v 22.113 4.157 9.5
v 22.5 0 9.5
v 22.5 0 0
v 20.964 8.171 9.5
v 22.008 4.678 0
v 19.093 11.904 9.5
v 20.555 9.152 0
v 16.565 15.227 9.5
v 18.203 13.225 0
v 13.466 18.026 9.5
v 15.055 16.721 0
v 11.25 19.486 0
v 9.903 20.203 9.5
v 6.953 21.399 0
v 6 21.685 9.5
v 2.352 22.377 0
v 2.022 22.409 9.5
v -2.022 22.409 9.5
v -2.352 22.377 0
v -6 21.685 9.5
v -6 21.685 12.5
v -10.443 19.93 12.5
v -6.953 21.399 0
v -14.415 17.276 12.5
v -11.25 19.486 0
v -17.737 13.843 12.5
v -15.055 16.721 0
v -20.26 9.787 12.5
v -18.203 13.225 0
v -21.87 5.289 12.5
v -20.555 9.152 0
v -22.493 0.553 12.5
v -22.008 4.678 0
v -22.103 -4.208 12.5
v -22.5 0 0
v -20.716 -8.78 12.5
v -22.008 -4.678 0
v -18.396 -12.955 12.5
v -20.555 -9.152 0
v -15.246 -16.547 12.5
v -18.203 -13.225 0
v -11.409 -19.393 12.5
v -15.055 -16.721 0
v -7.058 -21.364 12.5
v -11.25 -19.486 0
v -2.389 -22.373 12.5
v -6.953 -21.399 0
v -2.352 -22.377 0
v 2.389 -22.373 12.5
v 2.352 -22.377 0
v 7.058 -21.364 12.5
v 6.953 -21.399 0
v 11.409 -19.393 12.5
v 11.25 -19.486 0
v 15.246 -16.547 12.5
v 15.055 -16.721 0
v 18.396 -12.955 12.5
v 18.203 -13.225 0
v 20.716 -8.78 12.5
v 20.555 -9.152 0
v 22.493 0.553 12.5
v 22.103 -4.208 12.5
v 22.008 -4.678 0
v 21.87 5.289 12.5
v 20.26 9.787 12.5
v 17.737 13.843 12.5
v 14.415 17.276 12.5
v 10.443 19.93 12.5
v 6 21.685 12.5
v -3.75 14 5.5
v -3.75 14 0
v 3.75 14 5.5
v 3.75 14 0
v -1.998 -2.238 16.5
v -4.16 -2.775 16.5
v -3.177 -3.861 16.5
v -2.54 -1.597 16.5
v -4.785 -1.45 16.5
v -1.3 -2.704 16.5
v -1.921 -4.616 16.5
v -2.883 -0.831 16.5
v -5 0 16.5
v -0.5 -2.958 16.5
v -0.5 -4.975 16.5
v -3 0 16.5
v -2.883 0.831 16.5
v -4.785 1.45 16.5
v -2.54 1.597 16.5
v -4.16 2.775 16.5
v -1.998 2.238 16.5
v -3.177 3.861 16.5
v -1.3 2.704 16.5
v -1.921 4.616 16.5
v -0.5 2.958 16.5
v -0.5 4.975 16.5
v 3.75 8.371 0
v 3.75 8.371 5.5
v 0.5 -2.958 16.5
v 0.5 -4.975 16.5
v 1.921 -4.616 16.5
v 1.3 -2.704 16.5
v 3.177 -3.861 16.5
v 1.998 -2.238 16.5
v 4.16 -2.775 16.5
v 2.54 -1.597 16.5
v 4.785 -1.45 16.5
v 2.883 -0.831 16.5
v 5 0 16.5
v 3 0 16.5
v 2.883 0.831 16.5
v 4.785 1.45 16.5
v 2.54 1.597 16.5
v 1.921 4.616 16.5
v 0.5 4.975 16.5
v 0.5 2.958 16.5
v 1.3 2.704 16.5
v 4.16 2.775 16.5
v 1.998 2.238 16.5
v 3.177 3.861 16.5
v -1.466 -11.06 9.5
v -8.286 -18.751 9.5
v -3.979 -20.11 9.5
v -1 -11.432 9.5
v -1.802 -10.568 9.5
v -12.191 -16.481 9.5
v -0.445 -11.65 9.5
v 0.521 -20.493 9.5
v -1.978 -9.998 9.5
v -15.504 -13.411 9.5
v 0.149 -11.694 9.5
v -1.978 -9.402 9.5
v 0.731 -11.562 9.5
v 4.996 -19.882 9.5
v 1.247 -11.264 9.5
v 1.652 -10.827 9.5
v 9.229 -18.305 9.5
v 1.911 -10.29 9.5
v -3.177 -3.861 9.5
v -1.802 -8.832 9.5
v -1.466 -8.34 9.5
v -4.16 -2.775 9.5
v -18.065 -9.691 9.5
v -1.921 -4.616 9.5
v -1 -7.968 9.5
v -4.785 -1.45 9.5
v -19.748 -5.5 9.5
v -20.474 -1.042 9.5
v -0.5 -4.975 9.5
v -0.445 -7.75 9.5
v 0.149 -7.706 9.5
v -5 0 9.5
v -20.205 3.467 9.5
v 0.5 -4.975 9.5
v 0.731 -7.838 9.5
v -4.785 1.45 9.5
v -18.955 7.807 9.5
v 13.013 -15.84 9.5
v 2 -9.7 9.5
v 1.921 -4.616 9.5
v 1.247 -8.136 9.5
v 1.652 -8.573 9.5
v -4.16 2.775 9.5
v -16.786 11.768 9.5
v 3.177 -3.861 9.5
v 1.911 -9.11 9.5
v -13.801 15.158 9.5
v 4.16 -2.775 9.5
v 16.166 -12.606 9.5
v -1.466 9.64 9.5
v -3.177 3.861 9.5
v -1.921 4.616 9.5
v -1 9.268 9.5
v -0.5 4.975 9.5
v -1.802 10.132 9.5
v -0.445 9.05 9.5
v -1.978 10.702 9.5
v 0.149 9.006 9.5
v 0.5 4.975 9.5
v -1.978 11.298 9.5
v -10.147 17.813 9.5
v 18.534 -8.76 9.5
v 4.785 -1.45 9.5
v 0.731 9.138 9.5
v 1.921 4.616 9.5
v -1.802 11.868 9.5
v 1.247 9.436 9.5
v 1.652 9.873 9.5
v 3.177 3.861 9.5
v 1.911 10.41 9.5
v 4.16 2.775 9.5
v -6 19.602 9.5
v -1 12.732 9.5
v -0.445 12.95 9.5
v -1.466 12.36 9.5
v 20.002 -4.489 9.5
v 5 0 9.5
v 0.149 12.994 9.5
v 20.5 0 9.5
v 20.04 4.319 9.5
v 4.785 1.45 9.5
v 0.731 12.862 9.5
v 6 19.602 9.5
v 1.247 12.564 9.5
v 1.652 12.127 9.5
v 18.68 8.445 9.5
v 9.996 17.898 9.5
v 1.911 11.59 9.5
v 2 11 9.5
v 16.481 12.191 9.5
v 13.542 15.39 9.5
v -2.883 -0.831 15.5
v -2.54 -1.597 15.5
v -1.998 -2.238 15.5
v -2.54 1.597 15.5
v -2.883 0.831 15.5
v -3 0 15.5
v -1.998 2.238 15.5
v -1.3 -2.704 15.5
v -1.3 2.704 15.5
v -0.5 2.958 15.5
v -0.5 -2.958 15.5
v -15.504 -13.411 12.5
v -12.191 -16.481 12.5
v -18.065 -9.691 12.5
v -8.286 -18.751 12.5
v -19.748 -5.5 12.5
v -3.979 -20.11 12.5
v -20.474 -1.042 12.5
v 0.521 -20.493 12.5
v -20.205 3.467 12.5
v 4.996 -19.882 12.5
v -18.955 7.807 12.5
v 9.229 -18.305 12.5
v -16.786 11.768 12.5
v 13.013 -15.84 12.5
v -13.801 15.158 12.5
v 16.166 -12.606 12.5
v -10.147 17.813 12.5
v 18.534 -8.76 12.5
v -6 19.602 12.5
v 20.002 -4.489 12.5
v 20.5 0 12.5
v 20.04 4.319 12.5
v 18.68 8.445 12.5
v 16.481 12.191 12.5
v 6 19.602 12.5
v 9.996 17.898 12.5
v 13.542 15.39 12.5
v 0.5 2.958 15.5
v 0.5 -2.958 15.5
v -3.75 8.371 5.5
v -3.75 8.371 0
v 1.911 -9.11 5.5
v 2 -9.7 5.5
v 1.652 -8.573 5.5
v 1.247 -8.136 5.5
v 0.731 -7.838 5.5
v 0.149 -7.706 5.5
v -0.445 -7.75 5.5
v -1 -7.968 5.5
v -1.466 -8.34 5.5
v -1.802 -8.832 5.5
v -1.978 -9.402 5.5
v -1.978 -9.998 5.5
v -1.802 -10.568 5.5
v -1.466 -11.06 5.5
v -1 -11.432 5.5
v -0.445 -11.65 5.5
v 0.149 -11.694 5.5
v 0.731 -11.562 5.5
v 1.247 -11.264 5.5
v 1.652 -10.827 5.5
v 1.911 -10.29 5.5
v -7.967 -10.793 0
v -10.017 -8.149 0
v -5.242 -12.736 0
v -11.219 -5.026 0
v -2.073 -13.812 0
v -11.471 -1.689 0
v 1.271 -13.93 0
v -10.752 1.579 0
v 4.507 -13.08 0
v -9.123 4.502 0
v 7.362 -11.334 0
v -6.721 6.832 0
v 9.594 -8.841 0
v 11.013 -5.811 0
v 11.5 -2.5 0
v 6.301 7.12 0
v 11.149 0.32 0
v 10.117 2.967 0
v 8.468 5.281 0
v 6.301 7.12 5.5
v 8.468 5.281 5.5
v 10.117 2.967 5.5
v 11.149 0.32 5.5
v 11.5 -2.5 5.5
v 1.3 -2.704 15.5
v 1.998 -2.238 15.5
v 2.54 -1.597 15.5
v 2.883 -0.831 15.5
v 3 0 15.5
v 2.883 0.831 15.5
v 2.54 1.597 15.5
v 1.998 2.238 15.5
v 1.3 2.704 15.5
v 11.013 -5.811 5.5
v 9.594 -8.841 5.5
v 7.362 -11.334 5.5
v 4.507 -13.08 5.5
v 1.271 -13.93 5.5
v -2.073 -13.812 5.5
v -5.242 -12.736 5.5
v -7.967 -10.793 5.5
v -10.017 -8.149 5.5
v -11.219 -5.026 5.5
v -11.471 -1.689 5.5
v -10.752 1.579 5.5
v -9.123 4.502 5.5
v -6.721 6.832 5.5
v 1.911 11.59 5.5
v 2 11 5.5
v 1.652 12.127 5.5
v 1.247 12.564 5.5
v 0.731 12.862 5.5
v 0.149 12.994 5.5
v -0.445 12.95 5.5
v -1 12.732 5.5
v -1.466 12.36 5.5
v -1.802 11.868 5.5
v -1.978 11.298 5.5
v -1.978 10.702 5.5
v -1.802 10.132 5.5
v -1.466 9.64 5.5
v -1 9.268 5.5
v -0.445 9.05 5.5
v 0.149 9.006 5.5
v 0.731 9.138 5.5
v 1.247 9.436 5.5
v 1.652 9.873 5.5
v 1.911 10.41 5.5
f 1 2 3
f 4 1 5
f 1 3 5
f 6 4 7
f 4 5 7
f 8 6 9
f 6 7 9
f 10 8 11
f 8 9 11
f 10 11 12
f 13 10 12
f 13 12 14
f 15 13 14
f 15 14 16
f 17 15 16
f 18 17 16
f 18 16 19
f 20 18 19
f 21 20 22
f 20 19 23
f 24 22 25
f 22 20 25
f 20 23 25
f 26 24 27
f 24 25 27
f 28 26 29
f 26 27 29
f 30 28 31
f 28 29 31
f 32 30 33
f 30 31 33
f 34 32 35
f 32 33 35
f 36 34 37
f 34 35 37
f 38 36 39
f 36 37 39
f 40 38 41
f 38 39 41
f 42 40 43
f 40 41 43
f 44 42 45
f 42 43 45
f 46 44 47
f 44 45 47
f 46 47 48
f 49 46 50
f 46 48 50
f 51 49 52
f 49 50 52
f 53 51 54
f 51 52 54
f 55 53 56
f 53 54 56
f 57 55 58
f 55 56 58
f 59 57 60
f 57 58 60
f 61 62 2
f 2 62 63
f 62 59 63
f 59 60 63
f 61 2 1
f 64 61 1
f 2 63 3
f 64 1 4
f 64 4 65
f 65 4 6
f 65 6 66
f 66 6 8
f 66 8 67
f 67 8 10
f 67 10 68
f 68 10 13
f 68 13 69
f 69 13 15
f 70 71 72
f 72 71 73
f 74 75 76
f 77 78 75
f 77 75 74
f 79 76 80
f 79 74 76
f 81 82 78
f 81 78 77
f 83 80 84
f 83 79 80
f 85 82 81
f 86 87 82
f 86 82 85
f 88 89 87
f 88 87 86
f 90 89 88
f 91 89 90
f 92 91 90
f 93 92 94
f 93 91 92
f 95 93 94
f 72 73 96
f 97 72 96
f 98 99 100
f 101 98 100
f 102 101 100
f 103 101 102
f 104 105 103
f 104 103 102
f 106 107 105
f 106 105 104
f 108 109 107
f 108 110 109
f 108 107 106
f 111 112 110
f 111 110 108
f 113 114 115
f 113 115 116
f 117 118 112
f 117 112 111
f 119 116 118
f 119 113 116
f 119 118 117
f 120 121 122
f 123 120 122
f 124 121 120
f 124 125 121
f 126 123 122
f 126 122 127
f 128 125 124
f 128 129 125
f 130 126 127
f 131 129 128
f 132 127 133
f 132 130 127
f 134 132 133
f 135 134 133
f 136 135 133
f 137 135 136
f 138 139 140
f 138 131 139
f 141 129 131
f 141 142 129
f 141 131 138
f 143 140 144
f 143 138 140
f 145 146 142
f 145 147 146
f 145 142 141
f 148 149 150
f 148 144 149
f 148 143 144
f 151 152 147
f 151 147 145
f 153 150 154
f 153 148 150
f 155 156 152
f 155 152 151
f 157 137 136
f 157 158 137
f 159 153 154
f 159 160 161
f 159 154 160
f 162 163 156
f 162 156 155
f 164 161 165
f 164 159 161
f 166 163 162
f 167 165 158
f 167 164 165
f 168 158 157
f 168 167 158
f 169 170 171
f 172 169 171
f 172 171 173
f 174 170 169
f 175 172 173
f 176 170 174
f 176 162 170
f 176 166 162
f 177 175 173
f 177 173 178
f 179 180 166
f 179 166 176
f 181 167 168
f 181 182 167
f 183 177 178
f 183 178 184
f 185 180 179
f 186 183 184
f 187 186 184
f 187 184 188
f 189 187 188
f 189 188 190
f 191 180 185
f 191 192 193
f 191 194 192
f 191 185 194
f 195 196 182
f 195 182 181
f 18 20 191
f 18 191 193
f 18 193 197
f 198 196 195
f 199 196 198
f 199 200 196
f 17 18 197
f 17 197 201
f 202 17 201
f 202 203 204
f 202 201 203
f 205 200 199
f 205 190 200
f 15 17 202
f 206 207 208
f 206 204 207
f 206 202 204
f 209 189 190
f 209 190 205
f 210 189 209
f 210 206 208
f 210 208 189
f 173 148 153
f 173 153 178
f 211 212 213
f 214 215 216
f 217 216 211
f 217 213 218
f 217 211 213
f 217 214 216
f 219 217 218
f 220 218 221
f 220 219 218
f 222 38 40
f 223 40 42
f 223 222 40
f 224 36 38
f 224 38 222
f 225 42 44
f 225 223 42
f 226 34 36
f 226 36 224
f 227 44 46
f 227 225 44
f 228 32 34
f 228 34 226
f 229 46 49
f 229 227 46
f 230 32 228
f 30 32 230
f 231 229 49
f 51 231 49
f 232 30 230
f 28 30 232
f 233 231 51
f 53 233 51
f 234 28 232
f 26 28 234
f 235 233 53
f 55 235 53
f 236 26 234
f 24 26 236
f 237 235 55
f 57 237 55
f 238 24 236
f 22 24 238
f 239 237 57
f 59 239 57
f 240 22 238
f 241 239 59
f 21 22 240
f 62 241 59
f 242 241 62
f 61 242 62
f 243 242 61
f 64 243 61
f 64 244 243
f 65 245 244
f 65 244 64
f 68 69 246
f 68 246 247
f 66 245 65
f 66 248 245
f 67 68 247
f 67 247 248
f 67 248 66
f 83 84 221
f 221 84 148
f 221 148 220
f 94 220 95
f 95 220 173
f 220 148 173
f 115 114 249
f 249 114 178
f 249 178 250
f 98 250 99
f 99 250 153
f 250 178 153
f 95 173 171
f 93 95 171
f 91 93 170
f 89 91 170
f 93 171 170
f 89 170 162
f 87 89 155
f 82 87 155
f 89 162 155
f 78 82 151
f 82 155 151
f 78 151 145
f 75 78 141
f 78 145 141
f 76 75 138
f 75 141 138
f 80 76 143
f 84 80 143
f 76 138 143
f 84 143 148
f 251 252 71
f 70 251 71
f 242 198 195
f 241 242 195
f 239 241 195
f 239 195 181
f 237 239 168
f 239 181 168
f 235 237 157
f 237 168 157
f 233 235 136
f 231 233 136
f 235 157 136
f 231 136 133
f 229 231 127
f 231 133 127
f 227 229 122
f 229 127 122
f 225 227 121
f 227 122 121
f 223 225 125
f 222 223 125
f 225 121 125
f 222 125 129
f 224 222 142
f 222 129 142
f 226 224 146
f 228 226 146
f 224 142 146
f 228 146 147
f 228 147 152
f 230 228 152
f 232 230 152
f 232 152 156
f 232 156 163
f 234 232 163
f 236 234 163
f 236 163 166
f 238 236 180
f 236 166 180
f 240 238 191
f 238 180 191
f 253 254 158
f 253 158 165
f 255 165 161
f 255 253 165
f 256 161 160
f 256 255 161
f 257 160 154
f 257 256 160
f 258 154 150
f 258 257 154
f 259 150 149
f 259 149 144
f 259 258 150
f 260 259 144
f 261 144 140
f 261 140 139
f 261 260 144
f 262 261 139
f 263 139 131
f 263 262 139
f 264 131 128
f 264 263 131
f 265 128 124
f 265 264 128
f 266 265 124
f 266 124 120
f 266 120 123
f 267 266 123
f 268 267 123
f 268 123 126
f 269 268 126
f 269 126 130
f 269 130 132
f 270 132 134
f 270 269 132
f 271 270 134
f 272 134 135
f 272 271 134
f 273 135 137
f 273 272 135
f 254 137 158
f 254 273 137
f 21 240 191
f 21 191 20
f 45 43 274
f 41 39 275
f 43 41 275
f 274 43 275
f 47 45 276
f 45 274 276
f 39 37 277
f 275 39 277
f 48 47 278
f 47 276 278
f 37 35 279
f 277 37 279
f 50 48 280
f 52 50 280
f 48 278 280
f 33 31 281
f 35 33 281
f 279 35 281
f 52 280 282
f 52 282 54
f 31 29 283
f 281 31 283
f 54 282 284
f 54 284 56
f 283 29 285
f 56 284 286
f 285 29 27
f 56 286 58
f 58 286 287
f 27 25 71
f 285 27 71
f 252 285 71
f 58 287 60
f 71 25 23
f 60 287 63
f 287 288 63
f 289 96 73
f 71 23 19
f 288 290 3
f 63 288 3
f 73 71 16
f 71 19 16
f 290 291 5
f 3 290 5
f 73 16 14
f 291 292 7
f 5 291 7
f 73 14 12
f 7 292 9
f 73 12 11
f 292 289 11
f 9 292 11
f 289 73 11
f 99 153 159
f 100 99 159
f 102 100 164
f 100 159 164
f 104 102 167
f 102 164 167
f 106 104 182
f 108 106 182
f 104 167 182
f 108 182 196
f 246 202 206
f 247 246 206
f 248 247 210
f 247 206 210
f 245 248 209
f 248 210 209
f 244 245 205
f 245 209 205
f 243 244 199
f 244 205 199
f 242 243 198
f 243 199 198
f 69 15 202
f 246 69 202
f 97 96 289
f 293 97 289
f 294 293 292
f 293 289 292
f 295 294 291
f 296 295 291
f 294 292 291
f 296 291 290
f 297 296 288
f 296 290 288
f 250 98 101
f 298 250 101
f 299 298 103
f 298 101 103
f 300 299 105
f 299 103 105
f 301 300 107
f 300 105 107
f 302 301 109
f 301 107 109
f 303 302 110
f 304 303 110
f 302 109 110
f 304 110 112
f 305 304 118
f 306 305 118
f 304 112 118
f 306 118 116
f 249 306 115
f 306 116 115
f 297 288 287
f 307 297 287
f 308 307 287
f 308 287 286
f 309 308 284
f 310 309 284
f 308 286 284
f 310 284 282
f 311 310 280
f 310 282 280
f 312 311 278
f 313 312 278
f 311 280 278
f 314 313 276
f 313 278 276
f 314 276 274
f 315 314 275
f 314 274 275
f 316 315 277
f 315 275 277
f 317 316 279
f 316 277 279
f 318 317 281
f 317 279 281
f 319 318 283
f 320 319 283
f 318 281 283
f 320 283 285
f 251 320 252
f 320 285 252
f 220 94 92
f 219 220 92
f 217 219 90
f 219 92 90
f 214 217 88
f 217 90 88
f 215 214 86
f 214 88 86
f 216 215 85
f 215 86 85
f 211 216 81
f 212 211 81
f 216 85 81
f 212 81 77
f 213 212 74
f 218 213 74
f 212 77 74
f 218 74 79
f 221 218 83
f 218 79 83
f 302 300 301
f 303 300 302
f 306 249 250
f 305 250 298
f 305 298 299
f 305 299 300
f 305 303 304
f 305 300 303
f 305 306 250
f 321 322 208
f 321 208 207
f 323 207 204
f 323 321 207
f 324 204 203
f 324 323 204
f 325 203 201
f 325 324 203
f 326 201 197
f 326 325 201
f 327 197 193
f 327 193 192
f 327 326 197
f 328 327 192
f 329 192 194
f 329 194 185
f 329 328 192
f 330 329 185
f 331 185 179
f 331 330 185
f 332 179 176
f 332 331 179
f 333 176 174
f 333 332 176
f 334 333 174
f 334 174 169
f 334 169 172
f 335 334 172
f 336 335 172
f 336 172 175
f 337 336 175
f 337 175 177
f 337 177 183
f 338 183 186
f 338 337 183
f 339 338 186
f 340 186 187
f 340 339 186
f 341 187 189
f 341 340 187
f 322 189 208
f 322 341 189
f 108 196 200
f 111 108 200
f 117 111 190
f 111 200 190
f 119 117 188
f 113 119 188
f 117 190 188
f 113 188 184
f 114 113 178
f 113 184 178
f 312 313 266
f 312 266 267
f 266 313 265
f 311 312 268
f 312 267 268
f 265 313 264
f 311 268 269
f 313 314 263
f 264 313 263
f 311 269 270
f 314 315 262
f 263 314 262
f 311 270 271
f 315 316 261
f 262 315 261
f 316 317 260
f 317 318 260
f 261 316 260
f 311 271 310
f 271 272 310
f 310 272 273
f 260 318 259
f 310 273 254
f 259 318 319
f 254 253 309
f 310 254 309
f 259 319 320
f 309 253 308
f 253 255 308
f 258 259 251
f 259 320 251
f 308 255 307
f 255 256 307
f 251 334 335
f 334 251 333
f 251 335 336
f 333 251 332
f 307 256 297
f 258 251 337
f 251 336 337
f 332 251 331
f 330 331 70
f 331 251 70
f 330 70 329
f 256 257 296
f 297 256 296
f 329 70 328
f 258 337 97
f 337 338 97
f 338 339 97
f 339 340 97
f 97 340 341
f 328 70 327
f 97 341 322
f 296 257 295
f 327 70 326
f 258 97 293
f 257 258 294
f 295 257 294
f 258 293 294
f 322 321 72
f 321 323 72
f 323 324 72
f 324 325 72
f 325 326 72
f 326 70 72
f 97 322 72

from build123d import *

# Parameters (mm, degrees)
F0_R      = 22.5
F1_DEPTH  = 5.5
F2_R      = 22.5
F2_R_2    = 2
F3_DEPTH  = 4
F5_DEPTH  = 3
F6_DEPTH  = 7
F8_DEPTH  = 1
F10_DEPTH = 1


with BuildPart() as f1:
    # F0 (on Top) → F1 (new body)
    with BuildSketch(Plane.XY):
        Circle(F0_R)
        with BuildLine():
            Line((-3.75, 14), (3.75, 14))
            Line((3.75, 14), (3.75, 8.3714074526))
            ThreePointArc((3.75, 8.3714074526), (9.3641604002, 4.1755149614), (11.5, -2.5))
            ThreePointArc((11.5, -2.5), (-6.6755149614, -11.8641604002), (-3.75, 8.3714074526))
            Line((-3.75, 8.3714074526), (-3.75, 14))
        make_face(mode=Mode.SUBTRACT)
    extrude(amount=F1_DEPTH)

    # F2 (on face) → F3 (join)
    with BuildSketch(Plane.XY.offset(5.5)):
        Circle(F2_R)
        with Locations((0, -9.7)):
            Circle(F2_R_2, mode=Mode.SUBTRACT)
        with Locations((0, 11)):
            Circle(F2_R_2, mode=Mode.SUBTRACT)
    extrude(amount=F3_DEPTH)

    # F4 (on face) → F5 (join)
    with BuildSketch(Plane.XY.offset(9.5)):
        with BuildLine():
            ThreePointArc((-6, 21.6852484422), (-13.6244265934, -17.9060045795), (22.5, 0))
            ThreePointArc((22.5, 0), (17.9060045795, 13.6244265934), (6, 21.6852484422))
            Line((6, 21.6852484422), (6, 19.6022957839))
            ThreePointArc((6, 19.6022957839), (16.4810497238, 12.1911853402), (20.5, 0))
            ThreePointArc((20.5, 0), (-12.1911853402, -16.4810497238), (-6, 19.6022957839))
            Line((-6, 19.6022957839), (-6, 21.6852484422))
        make_face()
    extrude(amount=F5_DEPTH)

    # F4 (on face) → F6 (join)
    with BuildSketch(Plane.XY.offset(9.5)):
        with BuildLine():
            Line((-0.5, -4.9749371855), (-0.5, 4.9749371855))
            ThreePointArc((-0.5, 4.9749371855), (-5, 0), (-0.5, -4.9749371855))
        make_face()
        with BuildLine():
            ThreePointArc((0.5, -4.9749371855), (3.7080992435, -3.3541019662), (5, 0))
            ThreePointArc((5, 0), (3.7080992435, 3.3541019662), (0.5, 4.9749371855))
            Line((0.5, 4.9749371855), (0.5, -4.9749371855))
        make_face()
    extrude(amount=F6_DEPTH)

    # F7 (on face) → F8 (cut)
    with BuildSketch(Plane.XY.offset(16.5)):
        with BuildLine():
            Line((-0.5, -2.9580398915), (-0.5, 2.9580398915))
            ThreePointArc((-0.5, 2.9580398915), (-3, 0), (-0.5, -2.9580398915))
        make_face()
    extrude(amount=-F8_DEPTH, mode=Mode.SUBTRACT)

    # F9 (on face) → F10 (cut)
    with BuildSketch(Plane.XY.offset(16.5)):
        with BuildLine():
            Line((0.5, 2.9580398915), (0.5, -2.9580398915))
            ThreePointArc((0.5, -2.9580398915), (3, 0), (0.5, 2.9580398915))
        make_face()
    extrude(amount=-F10_DEPTH, mode=Mode.SUBTRACT)


solid = f1.part
